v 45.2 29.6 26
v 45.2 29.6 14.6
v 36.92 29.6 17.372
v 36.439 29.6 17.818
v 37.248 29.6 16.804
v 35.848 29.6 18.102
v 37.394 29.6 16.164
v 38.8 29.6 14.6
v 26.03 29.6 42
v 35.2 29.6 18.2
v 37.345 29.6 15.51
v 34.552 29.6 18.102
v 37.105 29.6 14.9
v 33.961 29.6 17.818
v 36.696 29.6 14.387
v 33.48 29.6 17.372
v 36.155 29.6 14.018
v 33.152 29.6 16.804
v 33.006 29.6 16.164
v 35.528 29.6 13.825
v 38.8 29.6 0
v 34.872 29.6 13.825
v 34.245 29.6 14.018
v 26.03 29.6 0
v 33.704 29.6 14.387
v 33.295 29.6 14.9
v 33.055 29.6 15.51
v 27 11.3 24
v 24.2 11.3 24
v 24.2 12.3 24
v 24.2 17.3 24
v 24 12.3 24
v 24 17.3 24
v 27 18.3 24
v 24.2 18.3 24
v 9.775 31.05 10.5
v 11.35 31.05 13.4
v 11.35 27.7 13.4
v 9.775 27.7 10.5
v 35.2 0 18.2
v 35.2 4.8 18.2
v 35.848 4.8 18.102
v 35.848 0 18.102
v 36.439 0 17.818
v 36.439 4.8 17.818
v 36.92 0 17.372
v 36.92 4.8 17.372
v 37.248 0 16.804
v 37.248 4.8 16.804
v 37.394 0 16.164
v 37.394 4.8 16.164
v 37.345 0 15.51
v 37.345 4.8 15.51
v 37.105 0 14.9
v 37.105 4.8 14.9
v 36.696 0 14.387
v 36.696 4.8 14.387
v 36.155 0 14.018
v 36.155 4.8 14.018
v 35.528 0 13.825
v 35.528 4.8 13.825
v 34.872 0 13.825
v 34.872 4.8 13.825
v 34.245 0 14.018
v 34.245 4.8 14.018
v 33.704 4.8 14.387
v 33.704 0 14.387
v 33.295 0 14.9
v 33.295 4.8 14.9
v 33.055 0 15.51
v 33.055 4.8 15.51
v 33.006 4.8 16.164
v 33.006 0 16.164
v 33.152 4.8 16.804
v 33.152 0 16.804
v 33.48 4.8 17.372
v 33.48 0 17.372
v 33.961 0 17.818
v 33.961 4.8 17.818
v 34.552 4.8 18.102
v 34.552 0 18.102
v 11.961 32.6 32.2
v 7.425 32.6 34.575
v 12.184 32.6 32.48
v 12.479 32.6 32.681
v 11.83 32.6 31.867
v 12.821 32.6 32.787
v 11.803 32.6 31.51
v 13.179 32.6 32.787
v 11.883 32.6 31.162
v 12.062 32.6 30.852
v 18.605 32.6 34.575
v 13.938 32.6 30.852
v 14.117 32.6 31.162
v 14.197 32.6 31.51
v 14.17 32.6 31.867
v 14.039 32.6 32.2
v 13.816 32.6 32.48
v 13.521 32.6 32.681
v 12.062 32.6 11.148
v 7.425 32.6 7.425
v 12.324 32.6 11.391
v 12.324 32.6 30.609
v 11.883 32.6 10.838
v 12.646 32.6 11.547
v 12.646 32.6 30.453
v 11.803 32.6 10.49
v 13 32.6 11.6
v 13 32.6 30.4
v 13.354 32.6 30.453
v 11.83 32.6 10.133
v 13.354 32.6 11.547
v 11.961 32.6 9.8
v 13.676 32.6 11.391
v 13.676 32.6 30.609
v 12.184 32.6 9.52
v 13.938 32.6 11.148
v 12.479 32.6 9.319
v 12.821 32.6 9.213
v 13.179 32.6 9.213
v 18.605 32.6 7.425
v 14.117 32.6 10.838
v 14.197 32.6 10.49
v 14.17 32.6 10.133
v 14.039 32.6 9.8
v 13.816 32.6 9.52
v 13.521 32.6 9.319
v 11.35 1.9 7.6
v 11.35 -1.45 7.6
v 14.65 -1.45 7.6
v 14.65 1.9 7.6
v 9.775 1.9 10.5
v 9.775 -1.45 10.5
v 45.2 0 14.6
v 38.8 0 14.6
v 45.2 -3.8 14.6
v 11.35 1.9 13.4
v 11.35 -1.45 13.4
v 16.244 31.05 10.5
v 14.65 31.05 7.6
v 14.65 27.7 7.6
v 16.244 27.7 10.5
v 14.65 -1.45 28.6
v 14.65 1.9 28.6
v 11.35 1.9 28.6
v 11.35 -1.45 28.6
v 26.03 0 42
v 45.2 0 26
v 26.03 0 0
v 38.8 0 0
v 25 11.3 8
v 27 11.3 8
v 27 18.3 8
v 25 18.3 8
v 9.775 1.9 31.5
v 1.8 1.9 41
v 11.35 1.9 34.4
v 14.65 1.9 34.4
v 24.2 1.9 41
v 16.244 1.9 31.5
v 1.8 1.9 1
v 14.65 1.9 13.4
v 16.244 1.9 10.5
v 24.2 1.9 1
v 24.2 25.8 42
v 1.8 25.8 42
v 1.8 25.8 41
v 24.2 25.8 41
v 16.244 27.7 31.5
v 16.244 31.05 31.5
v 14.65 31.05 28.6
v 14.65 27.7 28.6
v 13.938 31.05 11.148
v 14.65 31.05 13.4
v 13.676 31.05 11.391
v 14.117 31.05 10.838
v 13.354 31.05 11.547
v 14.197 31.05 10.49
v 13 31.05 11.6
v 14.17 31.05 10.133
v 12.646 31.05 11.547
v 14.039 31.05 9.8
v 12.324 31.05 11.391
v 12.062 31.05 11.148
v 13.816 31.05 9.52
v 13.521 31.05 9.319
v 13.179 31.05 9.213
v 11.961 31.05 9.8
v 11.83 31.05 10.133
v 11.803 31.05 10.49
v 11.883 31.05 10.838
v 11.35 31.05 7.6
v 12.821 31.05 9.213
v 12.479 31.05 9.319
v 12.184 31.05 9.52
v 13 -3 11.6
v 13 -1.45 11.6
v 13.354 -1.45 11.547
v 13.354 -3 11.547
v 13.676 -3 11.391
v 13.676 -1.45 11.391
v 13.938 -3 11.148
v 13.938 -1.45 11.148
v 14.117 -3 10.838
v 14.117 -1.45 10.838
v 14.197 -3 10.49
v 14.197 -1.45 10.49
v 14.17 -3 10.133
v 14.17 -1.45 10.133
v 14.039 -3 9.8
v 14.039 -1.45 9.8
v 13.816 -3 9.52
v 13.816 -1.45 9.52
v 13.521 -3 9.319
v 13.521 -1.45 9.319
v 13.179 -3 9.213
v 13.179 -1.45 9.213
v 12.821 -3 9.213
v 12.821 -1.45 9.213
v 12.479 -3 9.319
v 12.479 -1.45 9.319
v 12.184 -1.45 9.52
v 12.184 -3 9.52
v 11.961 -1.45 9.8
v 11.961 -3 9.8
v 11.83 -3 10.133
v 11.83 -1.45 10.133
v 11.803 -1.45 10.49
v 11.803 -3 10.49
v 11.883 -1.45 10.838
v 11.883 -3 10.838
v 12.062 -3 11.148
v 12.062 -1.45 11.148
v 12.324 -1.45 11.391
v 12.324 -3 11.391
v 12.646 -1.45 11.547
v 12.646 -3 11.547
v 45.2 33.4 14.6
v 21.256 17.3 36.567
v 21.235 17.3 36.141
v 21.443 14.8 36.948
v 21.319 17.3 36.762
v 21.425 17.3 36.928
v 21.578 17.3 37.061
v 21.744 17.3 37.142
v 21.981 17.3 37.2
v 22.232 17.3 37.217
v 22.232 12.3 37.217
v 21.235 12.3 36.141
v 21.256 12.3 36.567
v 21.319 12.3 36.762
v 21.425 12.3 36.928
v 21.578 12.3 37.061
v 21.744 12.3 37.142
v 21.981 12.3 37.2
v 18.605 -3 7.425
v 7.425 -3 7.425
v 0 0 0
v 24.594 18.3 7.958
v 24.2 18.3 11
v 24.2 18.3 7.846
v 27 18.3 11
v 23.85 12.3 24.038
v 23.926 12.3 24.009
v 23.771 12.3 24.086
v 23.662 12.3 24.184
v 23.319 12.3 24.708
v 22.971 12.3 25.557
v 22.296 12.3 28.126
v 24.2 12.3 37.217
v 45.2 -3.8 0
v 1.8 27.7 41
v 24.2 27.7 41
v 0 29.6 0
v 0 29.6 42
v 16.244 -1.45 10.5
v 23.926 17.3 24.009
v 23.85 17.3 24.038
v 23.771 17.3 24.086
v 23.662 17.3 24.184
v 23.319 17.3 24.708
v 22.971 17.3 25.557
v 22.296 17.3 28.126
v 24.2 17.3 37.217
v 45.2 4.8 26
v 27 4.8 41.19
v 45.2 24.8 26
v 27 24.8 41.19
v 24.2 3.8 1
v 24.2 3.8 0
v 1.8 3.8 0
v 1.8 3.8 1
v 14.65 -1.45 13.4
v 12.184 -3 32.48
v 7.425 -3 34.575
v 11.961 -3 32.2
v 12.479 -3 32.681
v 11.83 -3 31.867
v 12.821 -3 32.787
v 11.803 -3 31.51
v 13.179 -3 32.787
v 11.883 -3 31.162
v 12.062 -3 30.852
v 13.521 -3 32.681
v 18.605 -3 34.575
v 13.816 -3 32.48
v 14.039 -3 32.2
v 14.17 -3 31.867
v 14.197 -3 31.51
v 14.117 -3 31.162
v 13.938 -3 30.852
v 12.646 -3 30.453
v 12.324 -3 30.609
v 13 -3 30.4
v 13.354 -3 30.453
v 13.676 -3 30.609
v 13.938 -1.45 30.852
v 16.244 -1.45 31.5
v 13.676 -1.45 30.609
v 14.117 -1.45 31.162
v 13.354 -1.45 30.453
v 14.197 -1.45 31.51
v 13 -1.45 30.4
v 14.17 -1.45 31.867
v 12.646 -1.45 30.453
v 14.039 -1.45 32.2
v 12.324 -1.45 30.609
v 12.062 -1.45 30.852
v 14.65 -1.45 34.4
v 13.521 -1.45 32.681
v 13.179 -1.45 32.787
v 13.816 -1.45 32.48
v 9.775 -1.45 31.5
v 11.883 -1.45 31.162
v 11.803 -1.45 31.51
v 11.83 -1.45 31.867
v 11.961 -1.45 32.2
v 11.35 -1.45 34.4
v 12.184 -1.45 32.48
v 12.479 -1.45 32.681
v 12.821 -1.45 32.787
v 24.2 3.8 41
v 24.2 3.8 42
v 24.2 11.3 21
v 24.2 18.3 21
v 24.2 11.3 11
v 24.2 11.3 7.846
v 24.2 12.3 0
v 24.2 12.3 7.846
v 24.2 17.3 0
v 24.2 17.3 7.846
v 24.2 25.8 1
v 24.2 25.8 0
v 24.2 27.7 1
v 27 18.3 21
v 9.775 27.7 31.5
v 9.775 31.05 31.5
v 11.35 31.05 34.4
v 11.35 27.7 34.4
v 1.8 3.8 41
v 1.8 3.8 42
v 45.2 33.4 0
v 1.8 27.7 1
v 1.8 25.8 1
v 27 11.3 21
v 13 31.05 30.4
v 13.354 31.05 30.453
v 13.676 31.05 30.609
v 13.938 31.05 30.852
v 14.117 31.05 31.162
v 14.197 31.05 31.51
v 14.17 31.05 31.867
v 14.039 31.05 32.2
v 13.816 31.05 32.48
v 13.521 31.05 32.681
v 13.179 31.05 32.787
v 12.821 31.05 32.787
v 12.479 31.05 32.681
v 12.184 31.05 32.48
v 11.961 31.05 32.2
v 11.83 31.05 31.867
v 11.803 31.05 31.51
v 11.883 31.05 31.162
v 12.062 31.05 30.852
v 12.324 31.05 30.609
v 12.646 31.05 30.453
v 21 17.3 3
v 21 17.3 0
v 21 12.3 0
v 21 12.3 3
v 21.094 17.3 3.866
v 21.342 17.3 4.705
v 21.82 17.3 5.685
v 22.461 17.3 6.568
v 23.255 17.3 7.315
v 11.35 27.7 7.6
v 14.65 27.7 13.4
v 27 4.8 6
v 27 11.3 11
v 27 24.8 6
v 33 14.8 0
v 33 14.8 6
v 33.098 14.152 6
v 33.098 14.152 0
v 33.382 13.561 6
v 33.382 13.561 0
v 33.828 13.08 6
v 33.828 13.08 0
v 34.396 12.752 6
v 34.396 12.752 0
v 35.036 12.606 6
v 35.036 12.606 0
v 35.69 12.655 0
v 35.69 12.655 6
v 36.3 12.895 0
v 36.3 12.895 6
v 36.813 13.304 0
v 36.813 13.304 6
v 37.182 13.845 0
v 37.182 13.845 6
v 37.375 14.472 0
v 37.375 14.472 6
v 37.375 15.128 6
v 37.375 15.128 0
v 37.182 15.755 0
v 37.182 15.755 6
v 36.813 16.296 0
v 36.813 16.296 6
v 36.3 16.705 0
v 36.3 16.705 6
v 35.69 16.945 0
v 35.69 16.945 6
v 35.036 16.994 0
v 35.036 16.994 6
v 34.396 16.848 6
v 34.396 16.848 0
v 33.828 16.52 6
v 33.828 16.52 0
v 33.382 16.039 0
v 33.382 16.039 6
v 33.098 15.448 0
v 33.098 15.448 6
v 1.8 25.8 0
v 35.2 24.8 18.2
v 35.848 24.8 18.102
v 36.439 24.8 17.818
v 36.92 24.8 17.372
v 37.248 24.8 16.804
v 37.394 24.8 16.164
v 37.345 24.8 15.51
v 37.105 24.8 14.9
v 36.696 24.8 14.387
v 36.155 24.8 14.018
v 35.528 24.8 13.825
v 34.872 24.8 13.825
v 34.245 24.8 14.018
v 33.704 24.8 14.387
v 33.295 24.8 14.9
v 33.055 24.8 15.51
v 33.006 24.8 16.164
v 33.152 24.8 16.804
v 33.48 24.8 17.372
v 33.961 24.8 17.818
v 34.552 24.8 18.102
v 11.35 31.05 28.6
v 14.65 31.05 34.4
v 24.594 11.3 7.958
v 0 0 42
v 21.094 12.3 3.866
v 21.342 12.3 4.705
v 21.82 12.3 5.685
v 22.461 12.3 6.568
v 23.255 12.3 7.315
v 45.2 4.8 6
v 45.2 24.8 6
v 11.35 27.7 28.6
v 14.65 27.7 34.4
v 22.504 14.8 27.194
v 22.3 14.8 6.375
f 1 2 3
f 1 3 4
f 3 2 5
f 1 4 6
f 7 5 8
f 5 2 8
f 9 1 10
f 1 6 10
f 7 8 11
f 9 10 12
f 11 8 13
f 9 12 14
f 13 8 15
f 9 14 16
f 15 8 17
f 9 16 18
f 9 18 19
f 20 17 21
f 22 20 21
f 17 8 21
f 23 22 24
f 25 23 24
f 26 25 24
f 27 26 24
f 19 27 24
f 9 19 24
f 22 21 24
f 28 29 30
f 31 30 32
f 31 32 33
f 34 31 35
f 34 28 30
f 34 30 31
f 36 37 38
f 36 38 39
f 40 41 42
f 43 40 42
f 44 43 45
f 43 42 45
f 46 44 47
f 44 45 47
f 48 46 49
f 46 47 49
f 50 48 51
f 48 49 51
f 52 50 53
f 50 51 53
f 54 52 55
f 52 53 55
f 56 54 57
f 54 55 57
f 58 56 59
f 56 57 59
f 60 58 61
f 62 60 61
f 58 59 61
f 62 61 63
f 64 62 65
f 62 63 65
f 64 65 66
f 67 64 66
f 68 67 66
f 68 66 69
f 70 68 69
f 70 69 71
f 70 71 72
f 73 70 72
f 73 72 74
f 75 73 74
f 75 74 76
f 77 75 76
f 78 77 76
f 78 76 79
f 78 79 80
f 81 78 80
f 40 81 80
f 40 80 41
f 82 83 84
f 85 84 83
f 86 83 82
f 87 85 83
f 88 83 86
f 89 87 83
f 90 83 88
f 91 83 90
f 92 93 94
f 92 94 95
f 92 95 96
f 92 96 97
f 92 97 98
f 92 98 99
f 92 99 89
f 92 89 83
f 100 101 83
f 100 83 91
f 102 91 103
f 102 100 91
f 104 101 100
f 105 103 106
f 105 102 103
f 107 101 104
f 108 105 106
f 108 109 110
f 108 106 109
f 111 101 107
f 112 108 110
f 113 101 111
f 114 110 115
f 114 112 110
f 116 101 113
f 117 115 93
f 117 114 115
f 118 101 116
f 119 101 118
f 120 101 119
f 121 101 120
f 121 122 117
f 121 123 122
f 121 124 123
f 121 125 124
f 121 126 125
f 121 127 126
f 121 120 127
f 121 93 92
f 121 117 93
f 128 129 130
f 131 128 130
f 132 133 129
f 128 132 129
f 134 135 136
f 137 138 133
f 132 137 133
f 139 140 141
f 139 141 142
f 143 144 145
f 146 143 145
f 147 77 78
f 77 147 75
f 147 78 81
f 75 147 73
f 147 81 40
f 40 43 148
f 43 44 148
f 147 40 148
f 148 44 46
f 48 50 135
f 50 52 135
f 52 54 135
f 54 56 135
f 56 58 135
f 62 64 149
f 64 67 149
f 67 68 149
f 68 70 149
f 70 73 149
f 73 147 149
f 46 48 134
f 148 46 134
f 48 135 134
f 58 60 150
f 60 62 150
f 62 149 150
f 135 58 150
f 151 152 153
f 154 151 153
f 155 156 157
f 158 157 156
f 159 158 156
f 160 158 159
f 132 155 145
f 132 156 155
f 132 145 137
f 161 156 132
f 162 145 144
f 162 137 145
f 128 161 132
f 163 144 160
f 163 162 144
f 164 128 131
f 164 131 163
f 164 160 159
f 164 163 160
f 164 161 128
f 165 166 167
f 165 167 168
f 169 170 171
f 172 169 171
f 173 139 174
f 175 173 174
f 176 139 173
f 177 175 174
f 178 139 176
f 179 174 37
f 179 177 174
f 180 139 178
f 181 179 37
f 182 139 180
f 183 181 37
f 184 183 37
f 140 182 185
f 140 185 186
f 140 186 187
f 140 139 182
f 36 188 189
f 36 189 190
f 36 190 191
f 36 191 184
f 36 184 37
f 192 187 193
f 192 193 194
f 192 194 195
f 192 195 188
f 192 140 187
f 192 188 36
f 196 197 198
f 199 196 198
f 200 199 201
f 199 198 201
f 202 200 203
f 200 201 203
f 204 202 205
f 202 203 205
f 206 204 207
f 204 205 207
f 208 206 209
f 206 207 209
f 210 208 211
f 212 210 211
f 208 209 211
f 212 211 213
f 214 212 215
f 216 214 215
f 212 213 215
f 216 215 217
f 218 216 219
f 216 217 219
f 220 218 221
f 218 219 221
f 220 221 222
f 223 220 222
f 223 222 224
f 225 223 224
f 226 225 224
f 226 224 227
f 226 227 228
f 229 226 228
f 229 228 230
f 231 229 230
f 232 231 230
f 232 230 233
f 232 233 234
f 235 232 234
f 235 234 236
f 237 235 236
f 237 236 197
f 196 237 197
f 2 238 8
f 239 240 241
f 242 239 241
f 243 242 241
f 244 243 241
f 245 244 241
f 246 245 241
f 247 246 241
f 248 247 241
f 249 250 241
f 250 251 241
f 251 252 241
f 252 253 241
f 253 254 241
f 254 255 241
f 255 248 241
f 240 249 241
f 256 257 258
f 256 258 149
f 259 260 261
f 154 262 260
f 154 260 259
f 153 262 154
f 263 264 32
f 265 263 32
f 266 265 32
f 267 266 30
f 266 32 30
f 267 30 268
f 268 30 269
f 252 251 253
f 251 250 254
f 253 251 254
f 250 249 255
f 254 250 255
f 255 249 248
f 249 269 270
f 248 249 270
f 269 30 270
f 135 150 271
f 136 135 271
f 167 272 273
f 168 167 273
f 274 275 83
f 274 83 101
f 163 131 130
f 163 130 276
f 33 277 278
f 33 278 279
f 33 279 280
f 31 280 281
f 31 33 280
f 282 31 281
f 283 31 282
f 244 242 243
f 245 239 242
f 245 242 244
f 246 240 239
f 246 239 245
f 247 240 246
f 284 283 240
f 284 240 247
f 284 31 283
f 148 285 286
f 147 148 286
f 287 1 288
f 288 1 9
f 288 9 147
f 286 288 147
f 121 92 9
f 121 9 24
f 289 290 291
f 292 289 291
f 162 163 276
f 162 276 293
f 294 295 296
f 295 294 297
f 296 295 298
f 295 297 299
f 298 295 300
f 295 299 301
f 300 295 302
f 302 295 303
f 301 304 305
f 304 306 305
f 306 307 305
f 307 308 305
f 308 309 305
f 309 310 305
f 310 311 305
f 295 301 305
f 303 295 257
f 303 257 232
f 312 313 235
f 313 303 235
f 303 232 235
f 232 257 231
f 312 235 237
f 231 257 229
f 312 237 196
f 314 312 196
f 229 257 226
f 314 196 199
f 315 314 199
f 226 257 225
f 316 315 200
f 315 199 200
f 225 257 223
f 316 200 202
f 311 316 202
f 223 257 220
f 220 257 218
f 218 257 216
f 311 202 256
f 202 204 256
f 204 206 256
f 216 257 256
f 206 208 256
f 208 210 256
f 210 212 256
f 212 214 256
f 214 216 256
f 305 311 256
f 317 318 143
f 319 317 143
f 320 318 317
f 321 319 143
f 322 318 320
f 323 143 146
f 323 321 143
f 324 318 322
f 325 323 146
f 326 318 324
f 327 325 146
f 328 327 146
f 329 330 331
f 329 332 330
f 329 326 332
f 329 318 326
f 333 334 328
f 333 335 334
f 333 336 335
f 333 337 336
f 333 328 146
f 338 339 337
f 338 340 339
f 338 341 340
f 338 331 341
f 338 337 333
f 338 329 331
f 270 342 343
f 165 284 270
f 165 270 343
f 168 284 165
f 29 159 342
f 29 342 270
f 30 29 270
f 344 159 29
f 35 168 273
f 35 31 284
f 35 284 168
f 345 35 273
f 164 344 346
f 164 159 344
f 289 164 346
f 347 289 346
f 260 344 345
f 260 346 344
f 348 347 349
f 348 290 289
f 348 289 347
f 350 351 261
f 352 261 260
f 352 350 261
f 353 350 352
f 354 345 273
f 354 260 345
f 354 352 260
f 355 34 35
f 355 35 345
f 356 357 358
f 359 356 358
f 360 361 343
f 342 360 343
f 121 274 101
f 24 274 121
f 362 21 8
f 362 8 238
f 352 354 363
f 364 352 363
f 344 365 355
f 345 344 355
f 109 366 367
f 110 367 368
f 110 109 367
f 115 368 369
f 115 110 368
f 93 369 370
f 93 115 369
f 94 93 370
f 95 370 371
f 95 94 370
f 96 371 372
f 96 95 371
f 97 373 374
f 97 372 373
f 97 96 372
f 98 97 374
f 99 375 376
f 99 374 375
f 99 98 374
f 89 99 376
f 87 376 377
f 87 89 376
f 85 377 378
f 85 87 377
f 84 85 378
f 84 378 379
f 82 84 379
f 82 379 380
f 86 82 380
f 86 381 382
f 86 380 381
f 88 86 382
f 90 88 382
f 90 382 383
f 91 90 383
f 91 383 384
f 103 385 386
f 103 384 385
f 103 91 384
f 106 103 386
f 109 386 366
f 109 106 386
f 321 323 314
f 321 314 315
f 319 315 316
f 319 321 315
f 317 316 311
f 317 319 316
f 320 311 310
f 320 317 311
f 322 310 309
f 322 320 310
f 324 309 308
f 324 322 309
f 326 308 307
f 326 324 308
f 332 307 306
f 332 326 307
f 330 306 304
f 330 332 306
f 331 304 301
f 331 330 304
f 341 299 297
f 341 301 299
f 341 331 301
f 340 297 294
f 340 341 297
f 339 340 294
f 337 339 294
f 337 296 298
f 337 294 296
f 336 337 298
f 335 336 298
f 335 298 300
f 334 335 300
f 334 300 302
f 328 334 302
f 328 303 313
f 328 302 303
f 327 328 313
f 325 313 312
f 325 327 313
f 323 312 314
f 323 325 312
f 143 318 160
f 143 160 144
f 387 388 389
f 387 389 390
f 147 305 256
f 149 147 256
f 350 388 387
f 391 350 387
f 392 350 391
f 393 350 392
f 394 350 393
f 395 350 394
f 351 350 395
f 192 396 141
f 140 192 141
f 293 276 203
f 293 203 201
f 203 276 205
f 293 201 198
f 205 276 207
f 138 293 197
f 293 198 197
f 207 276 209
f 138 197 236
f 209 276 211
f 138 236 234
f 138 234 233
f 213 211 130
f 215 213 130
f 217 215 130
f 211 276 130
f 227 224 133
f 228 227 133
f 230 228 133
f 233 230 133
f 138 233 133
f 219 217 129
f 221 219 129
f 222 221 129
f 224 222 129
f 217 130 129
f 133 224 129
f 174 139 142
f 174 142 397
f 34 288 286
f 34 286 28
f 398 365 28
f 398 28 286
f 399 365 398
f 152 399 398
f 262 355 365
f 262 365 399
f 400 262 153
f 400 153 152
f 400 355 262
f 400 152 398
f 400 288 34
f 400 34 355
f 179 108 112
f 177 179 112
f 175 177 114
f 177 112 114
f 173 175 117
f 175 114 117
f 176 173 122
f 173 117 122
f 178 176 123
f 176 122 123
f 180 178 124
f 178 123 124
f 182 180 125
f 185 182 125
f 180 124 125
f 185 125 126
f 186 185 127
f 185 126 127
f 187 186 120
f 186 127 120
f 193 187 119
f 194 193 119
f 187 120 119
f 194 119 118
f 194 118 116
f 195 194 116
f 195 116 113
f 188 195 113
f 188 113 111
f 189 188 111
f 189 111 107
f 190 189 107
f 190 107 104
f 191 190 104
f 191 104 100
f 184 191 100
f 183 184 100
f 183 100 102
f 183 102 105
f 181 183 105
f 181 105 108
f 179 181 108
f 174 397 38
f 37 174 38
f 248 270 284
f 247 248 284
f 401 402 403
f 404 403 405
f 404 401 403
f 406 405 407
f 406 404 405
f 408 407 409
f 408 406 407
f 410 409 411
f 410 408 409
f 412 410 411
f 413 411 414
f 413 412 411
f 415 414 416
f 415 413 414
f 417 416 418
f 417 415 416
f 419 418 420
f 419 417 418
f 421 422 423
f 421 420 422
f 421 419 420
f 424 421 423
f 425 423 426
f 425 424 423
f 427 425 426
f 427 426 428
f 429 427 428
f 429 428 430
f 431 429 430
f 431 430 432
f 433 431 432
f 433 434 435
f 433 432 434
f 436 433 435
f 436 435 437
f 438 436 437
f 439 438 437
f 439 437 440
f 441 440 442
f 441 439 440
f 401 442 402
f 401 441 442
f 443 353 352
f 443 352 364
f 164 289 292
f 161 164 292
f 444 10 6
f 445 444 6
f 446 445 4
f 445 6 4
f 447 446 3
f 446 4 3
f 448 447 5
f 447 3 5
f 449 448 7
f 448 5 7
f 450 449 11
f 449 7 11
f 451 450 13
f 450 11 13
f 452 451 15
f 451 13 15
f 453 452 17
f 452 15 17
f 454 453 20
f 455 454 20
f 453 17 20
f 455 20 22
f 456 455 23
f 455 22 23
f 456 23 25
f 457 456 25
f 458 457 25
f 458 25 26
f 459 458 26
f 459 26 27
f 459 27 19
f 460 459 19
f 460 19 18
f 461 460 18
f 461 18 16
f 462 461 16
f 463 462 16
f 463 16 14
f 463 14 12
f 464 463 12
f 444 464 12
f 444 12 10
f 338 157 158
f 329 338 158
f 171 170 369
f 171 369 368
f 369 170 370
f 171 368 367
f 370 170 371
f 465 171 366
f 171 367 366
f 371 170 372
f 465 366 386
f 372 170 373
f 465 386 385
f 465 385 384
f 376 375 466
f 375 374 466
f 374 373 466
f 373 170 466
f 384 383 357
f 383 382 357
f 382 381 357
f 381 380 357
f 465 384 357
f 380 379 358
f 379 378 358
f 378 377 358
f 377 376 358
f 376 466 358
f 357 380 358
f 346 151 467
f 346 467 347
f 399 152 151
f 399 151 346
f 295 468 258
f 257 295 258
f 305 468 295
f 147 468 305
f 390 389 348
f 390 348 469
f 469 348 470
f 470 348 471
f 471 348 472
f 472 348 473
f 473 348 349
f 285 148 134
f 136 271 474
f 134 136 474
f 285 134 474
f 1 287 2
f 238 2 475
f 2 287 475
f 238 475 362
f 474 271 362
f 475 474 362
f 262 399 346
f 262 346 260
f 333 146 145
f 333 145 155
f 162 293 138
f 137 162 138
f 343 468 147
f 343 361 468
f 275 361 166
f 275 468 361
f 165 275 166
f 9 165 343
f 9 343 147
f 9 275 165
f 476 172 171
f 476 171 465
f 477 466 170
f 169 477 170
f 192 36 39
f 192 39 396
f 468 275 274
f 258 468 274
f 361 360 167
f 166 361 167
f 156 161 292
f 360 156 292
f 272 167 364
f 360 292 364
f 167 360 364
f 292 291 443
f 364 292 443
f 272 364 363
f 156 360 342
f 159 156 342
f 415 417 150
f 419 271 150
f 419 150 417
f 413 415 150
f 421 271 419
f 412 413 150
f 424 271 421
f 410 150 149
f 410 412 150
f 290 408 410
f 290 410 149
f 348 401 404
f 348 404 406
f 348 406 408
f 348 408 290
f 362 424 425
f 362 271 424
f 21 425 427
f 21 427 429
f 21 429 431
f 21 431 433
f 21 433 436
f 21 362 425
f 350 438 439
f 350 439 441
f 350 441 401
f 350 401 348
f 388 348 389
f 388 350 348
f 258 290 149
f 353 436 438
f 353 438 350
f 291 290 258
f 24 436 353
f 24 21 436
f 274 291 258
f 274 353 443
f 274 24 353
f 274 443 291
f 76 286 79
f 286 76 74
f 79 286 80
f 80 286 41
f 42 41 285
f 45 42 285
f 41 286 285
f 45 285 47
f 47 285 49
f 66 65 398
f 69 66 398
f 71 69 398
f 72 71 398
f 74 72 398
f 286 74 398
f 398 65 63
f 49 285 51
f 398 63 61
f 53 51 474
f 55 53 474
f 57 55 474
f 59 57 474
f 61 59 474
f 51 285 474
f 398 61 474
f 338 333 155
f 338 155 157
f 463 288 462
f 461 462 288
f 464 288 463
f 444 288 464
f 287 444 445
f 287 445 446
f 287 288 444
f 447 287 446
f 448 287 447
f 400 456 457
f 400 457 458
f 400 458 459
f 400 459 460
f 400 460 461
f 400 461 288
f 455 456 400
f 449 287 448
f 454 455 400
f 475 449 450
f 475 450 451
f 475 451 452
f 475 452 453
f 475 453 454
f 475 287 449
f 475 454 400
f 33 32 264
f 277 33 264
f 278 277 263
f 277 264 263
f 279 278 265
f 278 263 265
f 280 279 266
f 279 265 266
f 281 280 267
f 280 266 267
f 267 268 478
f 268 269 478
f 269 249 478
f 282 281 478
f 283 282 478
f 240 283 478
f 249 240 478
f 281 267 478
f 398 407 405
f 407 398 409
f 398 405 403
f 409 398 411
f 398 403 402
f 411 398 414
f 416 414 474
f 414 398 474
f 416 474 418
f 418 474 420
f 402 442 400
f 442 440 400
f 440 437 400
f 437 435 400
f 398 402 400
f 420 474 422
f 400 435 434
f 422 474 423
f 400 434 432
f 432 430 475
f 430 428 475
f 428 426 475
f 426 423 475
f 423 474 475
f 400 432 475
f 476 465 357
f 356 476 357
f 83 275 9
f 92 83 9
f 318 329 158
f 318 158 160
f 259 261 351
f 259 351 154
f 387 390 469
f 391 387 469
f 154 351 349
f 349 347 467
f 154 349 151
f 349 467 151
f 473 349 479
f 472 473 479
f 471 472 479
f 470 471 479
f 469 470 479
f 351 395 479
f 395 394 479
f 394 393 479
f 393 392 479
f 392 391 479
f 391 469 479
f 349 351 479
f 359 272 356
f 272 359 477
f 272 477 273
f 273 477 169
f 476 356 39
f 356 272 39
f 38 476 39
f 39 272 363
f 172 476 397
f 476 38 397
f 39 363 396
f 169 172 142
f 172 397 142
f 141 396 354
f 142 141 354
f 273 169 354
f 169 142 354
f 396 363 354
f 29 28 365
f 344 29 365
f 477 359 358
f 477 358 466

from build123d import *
from OCP.BRepFilletAPI import BRepFilletAPI_MakeChamfer

# Parameters (mm, degrees)
SKETCH1_R                  = 2.2
SKETCH1_W                  = 22.4
SKETCH1_H                  = 25.8
BOSS_EXTRUDE1_DEPTH        = 42
CUT_EXTRUDE1_DEPTH         = 69.433909723
BOSS_EXTRUDE2_DEPTH        = 14.6
SKETCH4_W                  = 36
SKETCH4_H                  = 20
CUT_EXTRUDE2_DEPTH         = 18.2
SKETCH5_R                  = 2.2
CUT_EXTRUDE3_DEPTH         = 71.161242862
SKETCH16_W                 = 26.03
SKETCH16_H                 = 42
BOSS_EXTRUDE6_DEPTH        = 3
CHAMFER1_SIZE              = 7.42526056
CHAMFER1_SIZE_2            = 3
CHAMFER1_OF_MIRROR7_SIZE   = 7.42526056
CHAMFER1_OF_MIRROR7_SIZE_2 = 3
CUT_EXTRUDE4_START         = -1.9
CUT_EXTRUDE4_DEPTH         = 3.35
SKETCH10_R                 = 1.2
CUT_EXTRUDE10_DEPTH        = 72.637978754
SKETCH13_W                 = 22.4
SKETCH13_H                 = 1.9
BOSS_EXTRUDE4_DEPTH        = 1
SKETCH14_W                 = 3
SKETCH14_H                 = 7
CUT_EXTRUDE11_DEPTH        = 2.8
SKETCH15_W                 = 22.4
SKETCH15_H                 = 1.9
BOSS_EXTRUDE5_DEPTH        = 1
MIRROR5_START              = -1.9
MIRROR5_COPY_1_DEPTH       = 3.35
SKETCH17_W                 = 13.216816462
SKETCH17_H                 = 5
SKETCH17_W_2               = 8
BOSS_EXTRUDE7_DEPTH        = 3.2
FILLET1_SIZE               = 3
FILLET1_SIZE_2             = 18
FILLET3_SIZE               = 5
FILLET3_SIZE_2             = 4


# Some blends are built 0.0001 mm under size
with BuildPart() as part:
    # Sketch1 → Boss-Extrude1 (new body)
    with BuildSketch(Plane.XY):
        Polygon((2, 0), (45.2, 0), (45.2, 29.6), (2, 29.6), (0, 29.6), (0, 27.6), (0, 2), (0, 0), align=None)
        with Locations(Location((35.2, 14.8, 0), (0, 0, 180))):
            Circle(SKETCH1_R, mode=Mode.SUBTRACT)
        with Locations((13, 14.8)):
            Rectangle(SKETCH1_W, SKETCH1_H, mode=Mode.SUBTRACT)
    extrude(amount=BOSS_EXTRUDE1_DEPTH)

    # Sketch2 → Cut-Extrude1 (cut, through all)
    with BuildSketch(Plane(origin=(0, 29.6, 0), x_dir=(1, 0, 0), z_dir=(0, 1, 0))):
        Polygon((45.2, -26), (26.03, -42), (45.2, -42), align=None)
    extrude(amount=-CUT_EXTRUDE1_DEPTH, mode=Mode.SUBTRACT)

    # Sketch3 → Boss-Extrude2 (add)
    with BuildSketch(Plane(origin=(0, 0, 0), x_dir=(-1, 0, 0), z_dir=(0, 0, -1))):
        Polygon((-38.8, 0), (-45.2, -3.8), (-45.2, 0), align=None)
        Polygon((-45.2, 29.6), (-38.8, 29.6), (-45.2, 33.4), align=None)
    extrude(amount=-BOSS_EXTRUDE2_DEPTH)

    # Sketch4 → Cut-Extrude2 (cut)
    with BuildSketch(Plane(origin=(45.2, 0, 0), x_dir=(0, 0, -1), z_dir=(1, 0, 0))):
        with Locations((-24, 14.8)):
            Rectangle(SKETCH4_W, SKETCH4_H)
    extrude(amount=-CUT_EXTRUDE2_DEPTH, mode=Mode.SUBTRACT)

    # Sketch5 → Cut-Extrude3 (cut, through all)
    with BuildSketch(Plane(origin=(0, 29.6, 0), x_dir=(1, 0, 0), z_dir=(0, 1, 0))):
        with Locations(Location((35.2, -16, 0), (0, 0, 270))):
            Circle(SKETCH5_R)
    extrude(amount=-CUT_EXTRUDE3_DEPTH, mode=Mode.SUBTRACT)

    # Sketch16 → Boss-Extrude6 (add)
    with BuildSketch(Plane(origin=(0, 29.6, 0), x_dir=(1, 0, 0), z_dir=(0, 1, 0))):
        with Locations((13.015, -21)):
            Rectangle(SKETCH16_W, SKETCH16_H)
    boss_extrude6 = extrude(amount=BOSS_EXTRUDE6_DEPTH)

    # Chamfer1
    chamfer1_edges_1 = [part.edges().sort_by_distance(p)[0] for p in [
        (13.015, 32.6, 42),
    ]]
    chamfer1_side_1 = [part.faces().sort_by_distance(p)[0] for p in [
        (13.015, 32.6, 41.94),
    ]]
    chamfer1_edges_2 = [part.edges().sort_by_distance(p)[0] for p in [
        (26.03, 32.6, 21),
    ]]
    chamfer1_side_2 = [part.faces().sort_by_distance(p)[0] for p in [
        (26.03, 32.54, 21),
    ]]
    chamfer1_edges_3 = [part.edges().sort_by_distance(p)[0] for p in [
        (13.015, 32.6, 0),
    ]]
    chamfer1_side_3 = [part.faces().sort_by_distance(p)[0] for p in [
        (13.015, 32.6, 0.06),
    ]]
    chamfer1_edges_4 = [part.edges().sort_by_distance(p)[0] for p in [
        (0, 32.6, 21),
    ]]
    chamfer1_side_4 = [part.faces().sort_by_distance(p)[0] for p in [
        (0.06, 32.6, 21),
    ]]
    chamfer1 = BRepFilletAPI_MakeChamfer(part.part.solid().wrapped)
    for e in chamfer1_edges_1:
        chamfer1.Add(CHAMFER1_SIZE - 0.0001, CHAMFER1_SIZE_2 - 0.0001, e.wrapped, chamfer1_side_1[0].wrapped)
    for e in chamfer1_edges_2:
        chamfer1.Add(CHAMFER1_SIZE_2 - 0.0001, CHAMFER1_SIZE - 0.0001, e.wrapped, chamfer1_side_2[0].wrapped)
    for e in chamfer1_edges_3:
        chamfer1.Add(CHAMFER1_SIZE - 0.0001, CHAMFER1_SIZE_2 - 0.0001, e.wrapped, chamfer1_side_3[0].wrapped)
    for e in chamfer1_edges_4:
        chamfer1.Add(CHAMFER1_SIZE - 0.0001, CHAMFER1_SIZE_2 - 0.0001, e.wrapped, chamfer1_side_4[0].wrapped)
    add(Compound.cast(chamfer1.Shape()), mode=Mode.REPLACE)  # a hair under: the kernel refuses the full size

    # Mirror7: Boss-Extrude6 across plane
    add(boss_extrude6.mirror(Plane(origin=(0, 14.8, 0), x_dir=(0, 0, 1), z_dir=(0, -1, 0))))

    # Chamfer1 of Mirror7
    chamfer1_of_mirror7_edges_1 = [part.edges().sort_by_distance(p)[0] for p in [
        (13.015, -3, 42),
    ]]
    chamfer1_of_mirror7_side_1 = [part.faces().sort_by_distance(p)[0] for p in [
        (13.015, -3, 41.94),
    ]]
    chamfer1_of_mirror7_edges_2 = [part.edges().sort_by_distance(p)[0] for p in [
        (26.03, -3, 21),
    ]]
    chamfer1_of_mirror7_side_2 = [part.faces().sort_by_distance(p)[0] for p in [
        (26.03, -2.94, 21),
    ]]
    chamfer1_of_mirror7_edges_3 = [part.edges().sort_by_distance(p)[0] for p in [
        (13.015, -3, 0),
    ]]
    chamfer1_of_mirror7_side_3 = [part.faces().sort_by_distance(p)[0] for p in [
        (13.015, -2.94, 0),
    ]]
    chamfer1_of_mirror7_edges_4 = [part.edges().sort_by_distance(p)[0] for p in [
        (0, -3, 21),
    ]]
    chamfer1_of_mirror7_side_4 = [part.faces().sort_by_distance(p)[0] for p in [
        (0.06, -3, 21),
    ]]
    chamfer1_of_mirror7 = BRepFilletAPI_MakeChamfer(part.part.solid().wrapped)
    for e in chamfer1_of_mirror7_edges_1:
        chamfer1_of_mirror7.Add(CHAMFER1_OF_MIRROR7_SIZE - 0.0001, CHAMFER1_OF_MIRROR7_SIZE_2 - 0.0001, e.wrapped, chamfer1_of_mirror7_side_1[0].wrapped)
    for e in chamfer1_of_mirror7_edges_2:
        chamfer1_of_mirror7.Add(CHAMFER1_OF_MIRROR7_SIZE_2 - 0.0001, CHAMFER1_OF_MIRROR7_SIZE - 0.0001, e.wrapped, chamfer1_of_mirror7_side_2[0].wrapped)
    for e in chamfer1_of_mirror7_edges_3:
        chamfer1_of_mirror7.Add(CHAMFER1_OF_MIRROR7_SIZE_2 - 0.0001, CHAMFER1_OF_MIRROR7_SIZE - 0.0001, e.wrapped, chamfer1_of_mirror7_side_3[0].wrapped)
    for e in chamfer1_of_mirror7_edges_4:
        chamfer1_of_mirror7.Add(CHAMFER1_OF_MIRROR7_SIZE - 0.0001, CHAMFER1_OF_MIRROR7_SIZE_2 - 0.0001, e.wrapped, chamfer1_of_mirror7_side_4[0].wrapped)
    add(Compound.cast(chamfer1_of_mirror7.Shape()), mode=Mode.REPLACE)  # a hair under: the kernel refuses the full size

    # Sketch6 → Cut-Extrude4 (cut)
    with BuildSketch(Plane(origin=(0, 29.6, 0), x_dir=(1, 0, 0), z_dir=(0, 1, 0)).offset(CUT_EXTRUDE4_START)):
        Polygon((11.35, -13.4), (9.775198425, -10.5), (11.35, -7.6), (14.65, -7.6), (16.244163906, -10.5), (14.65, -13.4), align=None)
    cut_extrude4 = extrude(amount=CUT_EXTRUDE4_DEPTH, mode=Mode.SUBTRACT)

    # Sketch10 → Cut-Extrude10 (cut, through all)
    with BuildSketch(Plane(origin=(0, 32.6, 0), x_dir=(1, 0, 0), z_dir=(0, 1, 0))):
        with Locations(Location((13, -10.4, 0), (0, 0, 270))):
            Circle(SKETCH10_R)
    cut_extrude10 = extrude(amount=-CUT_EXTRUDE10_DEPTH, mode=Mode.SUBTRACT)

    # Mirror4: Cut-Extrude4 across plane
    add(cut_extrude4.mirror(Plane(origin=(0, 14.8, 0), x_dir=(0, 0, 1), z_dir=(0, -1, 0))), mode=Mode.SUBTRACT)

    # Sketch13 → Boss-Extrude4 (add)
    with BuildSketch(Plane.XY.offset(42)):
        with Locations((13, 2.85)):
            Rectangle(SKETCH13_W, SKETCH13_H)
        with Locations((13, 26.75)):
            Rectangle(SKETCH13_W, SKETCH13_H)
    extrude(amount=-BOSS_EXTRUDE4_DEPTH)

    # Sketch14 → Cut-Extrude11 (cut)
    with BuildSketch(Plane(origin=(27, 0, 0), x_dir=(0, 0, -1), z_dir=(1, 0, 0))):
        with Locations((-9.5, 14.8)):
            Rectangle(SKETCH14_W, SKETCH14_H)
        with Locations((-22.5, 14.8)):
            Rectangle(SKETCH14_W, SKETCH14_H)
    extrude(amount=-CUT_EXTRUDE11_DEPTH, mode=Mode.SUBTRACT)

    # Sketch15 → Boss-Extrude5 (add)
    with BuildSketch(Plane(origin=(0, 0, 0), x_dir=(-1, 0, 0), z_dir=(0, 0, -1))):
        with Locations((-13, 2.85)):
            Rectangle(SKETCH15_W, SKETCH15_H)
        with Locations((-13, 26.75)):
            Rectangle(SKETCH15_W, SKETCH15_H)
    extrude(amount=-BOSS_EXTRUDE5_DEPTH)

    # Mirror5: Cut-Extrude4, Cut-Extrude10 across plane
    add(cut_extrude4.mirror(Plane.XY.offset(21)), mode=Mode.SUBTRACT)
    add(cut_extrude10.mirror(Plane.XY.offset(21)), mode=Mode.SUBTRACT)

    # Mirror5 copy 1 sketch → Mirror5 copy 1 (cut)
    with BuildSketch(Plane(origin=(0, 0, 42), x_dir=(1, 0, 0), z_dir=(0, -1, 0)).offset(MIRROR5_START)):
        Polygon((11.35, -13.4), (9.775198425, -10.5), (11.35, -7.6), (14.65, -7.6), (16.244163906, -10.5), (14.65, -13.4), align=None)
    extrude(amount=MIRROR5_COPY_1_DEPTH, mode=Mode.SUBTRACT)

    # Sketch17 → Boss-Extrude7 (add)
    with BuildSketch(Plane.ZY.offset(-24.2)):
        with Locations((30.608408231, 14.8)):
            Rectangle(SKETCH17_W, SKETCH17_H)
        with Locations((4, 14.8)):
            Rectangle(SKETCH17_W_2, SKETCH17_H)
    extrude(amount=BOSS_EXTRUDE7_DEPTH)

    # Fillet1
    # a fillet whose section is not a circle: 18, 3 mm, written as the material it takes off along each edge
    with BuildSketch(Plane(origin=(21, 12.3, 24), x_dir=(1, 0, 0), z_dir=(0, 1, 0))) as fillet1_piece_1:
        with BuildLine():
            Bezier((FILLET1_SIZE, 0), (0, 0), (0, -FILLET1_SIZE_2), weights=[1, 0.538461538, 1])
            Line((0, -FILLET1_SIZE_2), (0, 0))
            Line((0, 0), (FILLET1_SIZE, 0))
        make_face()
    extrude(amount=5, mode=Mode.SUBTRACT)

    # Fillet2
    # a fillet whose section is not a circle: 1 mm, written as the material it takes off along each edge
    with BuildSketch(Plane(origin=(21.159285498, 19.997028117, 37.216816462), x_dir=(1, 0, 0), z_dir=(0, -1, 0))) as fillet2_piece_1:
        with BuildLine():
            Bezier((1.072400011, 0), (-0.006916058, 0), (0.075305906, -1.076179691), weights=[1, 1, 1])
            ThreePointArc((0.075305906, -1.076179691), (0.035933118, -0.538210194), (0, 0))
            Line((0, 0), (1.072400011, 0))
        make_face()
    extrude(amount=10.394056235, mode=Mode.SUBTRACT)

    # Fillet3
    # a fillet whose section is not a circle: 5, 4 mm, written as the material it takes off along each edge
    with BuildSketch(Plane(origin=(21, -0.2, 8), x_dir=(0, 0, -1), z_dir=(0, 1, 0))) as fillet3_piece_1_section:
        with BuildLine():
            Bezier((FILLET3_SIZE, 0), (0, 0), (0, -FILLET3_SIZE_2), weights=[1, 0.538461538, 1])
            Line((0, -FILLET3_SIZE_2), (0, 0))
            Line((0, 0), (FILLET3_SIZE, 0))
        make_face()
    fillet3_piece_1 = extrude(amount=30, mode=Mode.PRIVATE)
    fillet3_piece_1 = split(fillet3_piece_1, bisect_by=Plane(origin=(21, 18.3, 8), z_dir=(0, -1, 0)), keep=Keep.TOP, mode=Mode.PRIVATE)
    fillet3_piece_1 = split(fillet3_piece_1, bisect_by=Plane(origin=(21, 11.3, 8), z_dir=(0, 1, 0)), keep=Keep.TOP, mode=Mode.PRIVATE)
    add(fillet3_piece_1, mode=Mode.SUBTRACT)


solid = part.part
